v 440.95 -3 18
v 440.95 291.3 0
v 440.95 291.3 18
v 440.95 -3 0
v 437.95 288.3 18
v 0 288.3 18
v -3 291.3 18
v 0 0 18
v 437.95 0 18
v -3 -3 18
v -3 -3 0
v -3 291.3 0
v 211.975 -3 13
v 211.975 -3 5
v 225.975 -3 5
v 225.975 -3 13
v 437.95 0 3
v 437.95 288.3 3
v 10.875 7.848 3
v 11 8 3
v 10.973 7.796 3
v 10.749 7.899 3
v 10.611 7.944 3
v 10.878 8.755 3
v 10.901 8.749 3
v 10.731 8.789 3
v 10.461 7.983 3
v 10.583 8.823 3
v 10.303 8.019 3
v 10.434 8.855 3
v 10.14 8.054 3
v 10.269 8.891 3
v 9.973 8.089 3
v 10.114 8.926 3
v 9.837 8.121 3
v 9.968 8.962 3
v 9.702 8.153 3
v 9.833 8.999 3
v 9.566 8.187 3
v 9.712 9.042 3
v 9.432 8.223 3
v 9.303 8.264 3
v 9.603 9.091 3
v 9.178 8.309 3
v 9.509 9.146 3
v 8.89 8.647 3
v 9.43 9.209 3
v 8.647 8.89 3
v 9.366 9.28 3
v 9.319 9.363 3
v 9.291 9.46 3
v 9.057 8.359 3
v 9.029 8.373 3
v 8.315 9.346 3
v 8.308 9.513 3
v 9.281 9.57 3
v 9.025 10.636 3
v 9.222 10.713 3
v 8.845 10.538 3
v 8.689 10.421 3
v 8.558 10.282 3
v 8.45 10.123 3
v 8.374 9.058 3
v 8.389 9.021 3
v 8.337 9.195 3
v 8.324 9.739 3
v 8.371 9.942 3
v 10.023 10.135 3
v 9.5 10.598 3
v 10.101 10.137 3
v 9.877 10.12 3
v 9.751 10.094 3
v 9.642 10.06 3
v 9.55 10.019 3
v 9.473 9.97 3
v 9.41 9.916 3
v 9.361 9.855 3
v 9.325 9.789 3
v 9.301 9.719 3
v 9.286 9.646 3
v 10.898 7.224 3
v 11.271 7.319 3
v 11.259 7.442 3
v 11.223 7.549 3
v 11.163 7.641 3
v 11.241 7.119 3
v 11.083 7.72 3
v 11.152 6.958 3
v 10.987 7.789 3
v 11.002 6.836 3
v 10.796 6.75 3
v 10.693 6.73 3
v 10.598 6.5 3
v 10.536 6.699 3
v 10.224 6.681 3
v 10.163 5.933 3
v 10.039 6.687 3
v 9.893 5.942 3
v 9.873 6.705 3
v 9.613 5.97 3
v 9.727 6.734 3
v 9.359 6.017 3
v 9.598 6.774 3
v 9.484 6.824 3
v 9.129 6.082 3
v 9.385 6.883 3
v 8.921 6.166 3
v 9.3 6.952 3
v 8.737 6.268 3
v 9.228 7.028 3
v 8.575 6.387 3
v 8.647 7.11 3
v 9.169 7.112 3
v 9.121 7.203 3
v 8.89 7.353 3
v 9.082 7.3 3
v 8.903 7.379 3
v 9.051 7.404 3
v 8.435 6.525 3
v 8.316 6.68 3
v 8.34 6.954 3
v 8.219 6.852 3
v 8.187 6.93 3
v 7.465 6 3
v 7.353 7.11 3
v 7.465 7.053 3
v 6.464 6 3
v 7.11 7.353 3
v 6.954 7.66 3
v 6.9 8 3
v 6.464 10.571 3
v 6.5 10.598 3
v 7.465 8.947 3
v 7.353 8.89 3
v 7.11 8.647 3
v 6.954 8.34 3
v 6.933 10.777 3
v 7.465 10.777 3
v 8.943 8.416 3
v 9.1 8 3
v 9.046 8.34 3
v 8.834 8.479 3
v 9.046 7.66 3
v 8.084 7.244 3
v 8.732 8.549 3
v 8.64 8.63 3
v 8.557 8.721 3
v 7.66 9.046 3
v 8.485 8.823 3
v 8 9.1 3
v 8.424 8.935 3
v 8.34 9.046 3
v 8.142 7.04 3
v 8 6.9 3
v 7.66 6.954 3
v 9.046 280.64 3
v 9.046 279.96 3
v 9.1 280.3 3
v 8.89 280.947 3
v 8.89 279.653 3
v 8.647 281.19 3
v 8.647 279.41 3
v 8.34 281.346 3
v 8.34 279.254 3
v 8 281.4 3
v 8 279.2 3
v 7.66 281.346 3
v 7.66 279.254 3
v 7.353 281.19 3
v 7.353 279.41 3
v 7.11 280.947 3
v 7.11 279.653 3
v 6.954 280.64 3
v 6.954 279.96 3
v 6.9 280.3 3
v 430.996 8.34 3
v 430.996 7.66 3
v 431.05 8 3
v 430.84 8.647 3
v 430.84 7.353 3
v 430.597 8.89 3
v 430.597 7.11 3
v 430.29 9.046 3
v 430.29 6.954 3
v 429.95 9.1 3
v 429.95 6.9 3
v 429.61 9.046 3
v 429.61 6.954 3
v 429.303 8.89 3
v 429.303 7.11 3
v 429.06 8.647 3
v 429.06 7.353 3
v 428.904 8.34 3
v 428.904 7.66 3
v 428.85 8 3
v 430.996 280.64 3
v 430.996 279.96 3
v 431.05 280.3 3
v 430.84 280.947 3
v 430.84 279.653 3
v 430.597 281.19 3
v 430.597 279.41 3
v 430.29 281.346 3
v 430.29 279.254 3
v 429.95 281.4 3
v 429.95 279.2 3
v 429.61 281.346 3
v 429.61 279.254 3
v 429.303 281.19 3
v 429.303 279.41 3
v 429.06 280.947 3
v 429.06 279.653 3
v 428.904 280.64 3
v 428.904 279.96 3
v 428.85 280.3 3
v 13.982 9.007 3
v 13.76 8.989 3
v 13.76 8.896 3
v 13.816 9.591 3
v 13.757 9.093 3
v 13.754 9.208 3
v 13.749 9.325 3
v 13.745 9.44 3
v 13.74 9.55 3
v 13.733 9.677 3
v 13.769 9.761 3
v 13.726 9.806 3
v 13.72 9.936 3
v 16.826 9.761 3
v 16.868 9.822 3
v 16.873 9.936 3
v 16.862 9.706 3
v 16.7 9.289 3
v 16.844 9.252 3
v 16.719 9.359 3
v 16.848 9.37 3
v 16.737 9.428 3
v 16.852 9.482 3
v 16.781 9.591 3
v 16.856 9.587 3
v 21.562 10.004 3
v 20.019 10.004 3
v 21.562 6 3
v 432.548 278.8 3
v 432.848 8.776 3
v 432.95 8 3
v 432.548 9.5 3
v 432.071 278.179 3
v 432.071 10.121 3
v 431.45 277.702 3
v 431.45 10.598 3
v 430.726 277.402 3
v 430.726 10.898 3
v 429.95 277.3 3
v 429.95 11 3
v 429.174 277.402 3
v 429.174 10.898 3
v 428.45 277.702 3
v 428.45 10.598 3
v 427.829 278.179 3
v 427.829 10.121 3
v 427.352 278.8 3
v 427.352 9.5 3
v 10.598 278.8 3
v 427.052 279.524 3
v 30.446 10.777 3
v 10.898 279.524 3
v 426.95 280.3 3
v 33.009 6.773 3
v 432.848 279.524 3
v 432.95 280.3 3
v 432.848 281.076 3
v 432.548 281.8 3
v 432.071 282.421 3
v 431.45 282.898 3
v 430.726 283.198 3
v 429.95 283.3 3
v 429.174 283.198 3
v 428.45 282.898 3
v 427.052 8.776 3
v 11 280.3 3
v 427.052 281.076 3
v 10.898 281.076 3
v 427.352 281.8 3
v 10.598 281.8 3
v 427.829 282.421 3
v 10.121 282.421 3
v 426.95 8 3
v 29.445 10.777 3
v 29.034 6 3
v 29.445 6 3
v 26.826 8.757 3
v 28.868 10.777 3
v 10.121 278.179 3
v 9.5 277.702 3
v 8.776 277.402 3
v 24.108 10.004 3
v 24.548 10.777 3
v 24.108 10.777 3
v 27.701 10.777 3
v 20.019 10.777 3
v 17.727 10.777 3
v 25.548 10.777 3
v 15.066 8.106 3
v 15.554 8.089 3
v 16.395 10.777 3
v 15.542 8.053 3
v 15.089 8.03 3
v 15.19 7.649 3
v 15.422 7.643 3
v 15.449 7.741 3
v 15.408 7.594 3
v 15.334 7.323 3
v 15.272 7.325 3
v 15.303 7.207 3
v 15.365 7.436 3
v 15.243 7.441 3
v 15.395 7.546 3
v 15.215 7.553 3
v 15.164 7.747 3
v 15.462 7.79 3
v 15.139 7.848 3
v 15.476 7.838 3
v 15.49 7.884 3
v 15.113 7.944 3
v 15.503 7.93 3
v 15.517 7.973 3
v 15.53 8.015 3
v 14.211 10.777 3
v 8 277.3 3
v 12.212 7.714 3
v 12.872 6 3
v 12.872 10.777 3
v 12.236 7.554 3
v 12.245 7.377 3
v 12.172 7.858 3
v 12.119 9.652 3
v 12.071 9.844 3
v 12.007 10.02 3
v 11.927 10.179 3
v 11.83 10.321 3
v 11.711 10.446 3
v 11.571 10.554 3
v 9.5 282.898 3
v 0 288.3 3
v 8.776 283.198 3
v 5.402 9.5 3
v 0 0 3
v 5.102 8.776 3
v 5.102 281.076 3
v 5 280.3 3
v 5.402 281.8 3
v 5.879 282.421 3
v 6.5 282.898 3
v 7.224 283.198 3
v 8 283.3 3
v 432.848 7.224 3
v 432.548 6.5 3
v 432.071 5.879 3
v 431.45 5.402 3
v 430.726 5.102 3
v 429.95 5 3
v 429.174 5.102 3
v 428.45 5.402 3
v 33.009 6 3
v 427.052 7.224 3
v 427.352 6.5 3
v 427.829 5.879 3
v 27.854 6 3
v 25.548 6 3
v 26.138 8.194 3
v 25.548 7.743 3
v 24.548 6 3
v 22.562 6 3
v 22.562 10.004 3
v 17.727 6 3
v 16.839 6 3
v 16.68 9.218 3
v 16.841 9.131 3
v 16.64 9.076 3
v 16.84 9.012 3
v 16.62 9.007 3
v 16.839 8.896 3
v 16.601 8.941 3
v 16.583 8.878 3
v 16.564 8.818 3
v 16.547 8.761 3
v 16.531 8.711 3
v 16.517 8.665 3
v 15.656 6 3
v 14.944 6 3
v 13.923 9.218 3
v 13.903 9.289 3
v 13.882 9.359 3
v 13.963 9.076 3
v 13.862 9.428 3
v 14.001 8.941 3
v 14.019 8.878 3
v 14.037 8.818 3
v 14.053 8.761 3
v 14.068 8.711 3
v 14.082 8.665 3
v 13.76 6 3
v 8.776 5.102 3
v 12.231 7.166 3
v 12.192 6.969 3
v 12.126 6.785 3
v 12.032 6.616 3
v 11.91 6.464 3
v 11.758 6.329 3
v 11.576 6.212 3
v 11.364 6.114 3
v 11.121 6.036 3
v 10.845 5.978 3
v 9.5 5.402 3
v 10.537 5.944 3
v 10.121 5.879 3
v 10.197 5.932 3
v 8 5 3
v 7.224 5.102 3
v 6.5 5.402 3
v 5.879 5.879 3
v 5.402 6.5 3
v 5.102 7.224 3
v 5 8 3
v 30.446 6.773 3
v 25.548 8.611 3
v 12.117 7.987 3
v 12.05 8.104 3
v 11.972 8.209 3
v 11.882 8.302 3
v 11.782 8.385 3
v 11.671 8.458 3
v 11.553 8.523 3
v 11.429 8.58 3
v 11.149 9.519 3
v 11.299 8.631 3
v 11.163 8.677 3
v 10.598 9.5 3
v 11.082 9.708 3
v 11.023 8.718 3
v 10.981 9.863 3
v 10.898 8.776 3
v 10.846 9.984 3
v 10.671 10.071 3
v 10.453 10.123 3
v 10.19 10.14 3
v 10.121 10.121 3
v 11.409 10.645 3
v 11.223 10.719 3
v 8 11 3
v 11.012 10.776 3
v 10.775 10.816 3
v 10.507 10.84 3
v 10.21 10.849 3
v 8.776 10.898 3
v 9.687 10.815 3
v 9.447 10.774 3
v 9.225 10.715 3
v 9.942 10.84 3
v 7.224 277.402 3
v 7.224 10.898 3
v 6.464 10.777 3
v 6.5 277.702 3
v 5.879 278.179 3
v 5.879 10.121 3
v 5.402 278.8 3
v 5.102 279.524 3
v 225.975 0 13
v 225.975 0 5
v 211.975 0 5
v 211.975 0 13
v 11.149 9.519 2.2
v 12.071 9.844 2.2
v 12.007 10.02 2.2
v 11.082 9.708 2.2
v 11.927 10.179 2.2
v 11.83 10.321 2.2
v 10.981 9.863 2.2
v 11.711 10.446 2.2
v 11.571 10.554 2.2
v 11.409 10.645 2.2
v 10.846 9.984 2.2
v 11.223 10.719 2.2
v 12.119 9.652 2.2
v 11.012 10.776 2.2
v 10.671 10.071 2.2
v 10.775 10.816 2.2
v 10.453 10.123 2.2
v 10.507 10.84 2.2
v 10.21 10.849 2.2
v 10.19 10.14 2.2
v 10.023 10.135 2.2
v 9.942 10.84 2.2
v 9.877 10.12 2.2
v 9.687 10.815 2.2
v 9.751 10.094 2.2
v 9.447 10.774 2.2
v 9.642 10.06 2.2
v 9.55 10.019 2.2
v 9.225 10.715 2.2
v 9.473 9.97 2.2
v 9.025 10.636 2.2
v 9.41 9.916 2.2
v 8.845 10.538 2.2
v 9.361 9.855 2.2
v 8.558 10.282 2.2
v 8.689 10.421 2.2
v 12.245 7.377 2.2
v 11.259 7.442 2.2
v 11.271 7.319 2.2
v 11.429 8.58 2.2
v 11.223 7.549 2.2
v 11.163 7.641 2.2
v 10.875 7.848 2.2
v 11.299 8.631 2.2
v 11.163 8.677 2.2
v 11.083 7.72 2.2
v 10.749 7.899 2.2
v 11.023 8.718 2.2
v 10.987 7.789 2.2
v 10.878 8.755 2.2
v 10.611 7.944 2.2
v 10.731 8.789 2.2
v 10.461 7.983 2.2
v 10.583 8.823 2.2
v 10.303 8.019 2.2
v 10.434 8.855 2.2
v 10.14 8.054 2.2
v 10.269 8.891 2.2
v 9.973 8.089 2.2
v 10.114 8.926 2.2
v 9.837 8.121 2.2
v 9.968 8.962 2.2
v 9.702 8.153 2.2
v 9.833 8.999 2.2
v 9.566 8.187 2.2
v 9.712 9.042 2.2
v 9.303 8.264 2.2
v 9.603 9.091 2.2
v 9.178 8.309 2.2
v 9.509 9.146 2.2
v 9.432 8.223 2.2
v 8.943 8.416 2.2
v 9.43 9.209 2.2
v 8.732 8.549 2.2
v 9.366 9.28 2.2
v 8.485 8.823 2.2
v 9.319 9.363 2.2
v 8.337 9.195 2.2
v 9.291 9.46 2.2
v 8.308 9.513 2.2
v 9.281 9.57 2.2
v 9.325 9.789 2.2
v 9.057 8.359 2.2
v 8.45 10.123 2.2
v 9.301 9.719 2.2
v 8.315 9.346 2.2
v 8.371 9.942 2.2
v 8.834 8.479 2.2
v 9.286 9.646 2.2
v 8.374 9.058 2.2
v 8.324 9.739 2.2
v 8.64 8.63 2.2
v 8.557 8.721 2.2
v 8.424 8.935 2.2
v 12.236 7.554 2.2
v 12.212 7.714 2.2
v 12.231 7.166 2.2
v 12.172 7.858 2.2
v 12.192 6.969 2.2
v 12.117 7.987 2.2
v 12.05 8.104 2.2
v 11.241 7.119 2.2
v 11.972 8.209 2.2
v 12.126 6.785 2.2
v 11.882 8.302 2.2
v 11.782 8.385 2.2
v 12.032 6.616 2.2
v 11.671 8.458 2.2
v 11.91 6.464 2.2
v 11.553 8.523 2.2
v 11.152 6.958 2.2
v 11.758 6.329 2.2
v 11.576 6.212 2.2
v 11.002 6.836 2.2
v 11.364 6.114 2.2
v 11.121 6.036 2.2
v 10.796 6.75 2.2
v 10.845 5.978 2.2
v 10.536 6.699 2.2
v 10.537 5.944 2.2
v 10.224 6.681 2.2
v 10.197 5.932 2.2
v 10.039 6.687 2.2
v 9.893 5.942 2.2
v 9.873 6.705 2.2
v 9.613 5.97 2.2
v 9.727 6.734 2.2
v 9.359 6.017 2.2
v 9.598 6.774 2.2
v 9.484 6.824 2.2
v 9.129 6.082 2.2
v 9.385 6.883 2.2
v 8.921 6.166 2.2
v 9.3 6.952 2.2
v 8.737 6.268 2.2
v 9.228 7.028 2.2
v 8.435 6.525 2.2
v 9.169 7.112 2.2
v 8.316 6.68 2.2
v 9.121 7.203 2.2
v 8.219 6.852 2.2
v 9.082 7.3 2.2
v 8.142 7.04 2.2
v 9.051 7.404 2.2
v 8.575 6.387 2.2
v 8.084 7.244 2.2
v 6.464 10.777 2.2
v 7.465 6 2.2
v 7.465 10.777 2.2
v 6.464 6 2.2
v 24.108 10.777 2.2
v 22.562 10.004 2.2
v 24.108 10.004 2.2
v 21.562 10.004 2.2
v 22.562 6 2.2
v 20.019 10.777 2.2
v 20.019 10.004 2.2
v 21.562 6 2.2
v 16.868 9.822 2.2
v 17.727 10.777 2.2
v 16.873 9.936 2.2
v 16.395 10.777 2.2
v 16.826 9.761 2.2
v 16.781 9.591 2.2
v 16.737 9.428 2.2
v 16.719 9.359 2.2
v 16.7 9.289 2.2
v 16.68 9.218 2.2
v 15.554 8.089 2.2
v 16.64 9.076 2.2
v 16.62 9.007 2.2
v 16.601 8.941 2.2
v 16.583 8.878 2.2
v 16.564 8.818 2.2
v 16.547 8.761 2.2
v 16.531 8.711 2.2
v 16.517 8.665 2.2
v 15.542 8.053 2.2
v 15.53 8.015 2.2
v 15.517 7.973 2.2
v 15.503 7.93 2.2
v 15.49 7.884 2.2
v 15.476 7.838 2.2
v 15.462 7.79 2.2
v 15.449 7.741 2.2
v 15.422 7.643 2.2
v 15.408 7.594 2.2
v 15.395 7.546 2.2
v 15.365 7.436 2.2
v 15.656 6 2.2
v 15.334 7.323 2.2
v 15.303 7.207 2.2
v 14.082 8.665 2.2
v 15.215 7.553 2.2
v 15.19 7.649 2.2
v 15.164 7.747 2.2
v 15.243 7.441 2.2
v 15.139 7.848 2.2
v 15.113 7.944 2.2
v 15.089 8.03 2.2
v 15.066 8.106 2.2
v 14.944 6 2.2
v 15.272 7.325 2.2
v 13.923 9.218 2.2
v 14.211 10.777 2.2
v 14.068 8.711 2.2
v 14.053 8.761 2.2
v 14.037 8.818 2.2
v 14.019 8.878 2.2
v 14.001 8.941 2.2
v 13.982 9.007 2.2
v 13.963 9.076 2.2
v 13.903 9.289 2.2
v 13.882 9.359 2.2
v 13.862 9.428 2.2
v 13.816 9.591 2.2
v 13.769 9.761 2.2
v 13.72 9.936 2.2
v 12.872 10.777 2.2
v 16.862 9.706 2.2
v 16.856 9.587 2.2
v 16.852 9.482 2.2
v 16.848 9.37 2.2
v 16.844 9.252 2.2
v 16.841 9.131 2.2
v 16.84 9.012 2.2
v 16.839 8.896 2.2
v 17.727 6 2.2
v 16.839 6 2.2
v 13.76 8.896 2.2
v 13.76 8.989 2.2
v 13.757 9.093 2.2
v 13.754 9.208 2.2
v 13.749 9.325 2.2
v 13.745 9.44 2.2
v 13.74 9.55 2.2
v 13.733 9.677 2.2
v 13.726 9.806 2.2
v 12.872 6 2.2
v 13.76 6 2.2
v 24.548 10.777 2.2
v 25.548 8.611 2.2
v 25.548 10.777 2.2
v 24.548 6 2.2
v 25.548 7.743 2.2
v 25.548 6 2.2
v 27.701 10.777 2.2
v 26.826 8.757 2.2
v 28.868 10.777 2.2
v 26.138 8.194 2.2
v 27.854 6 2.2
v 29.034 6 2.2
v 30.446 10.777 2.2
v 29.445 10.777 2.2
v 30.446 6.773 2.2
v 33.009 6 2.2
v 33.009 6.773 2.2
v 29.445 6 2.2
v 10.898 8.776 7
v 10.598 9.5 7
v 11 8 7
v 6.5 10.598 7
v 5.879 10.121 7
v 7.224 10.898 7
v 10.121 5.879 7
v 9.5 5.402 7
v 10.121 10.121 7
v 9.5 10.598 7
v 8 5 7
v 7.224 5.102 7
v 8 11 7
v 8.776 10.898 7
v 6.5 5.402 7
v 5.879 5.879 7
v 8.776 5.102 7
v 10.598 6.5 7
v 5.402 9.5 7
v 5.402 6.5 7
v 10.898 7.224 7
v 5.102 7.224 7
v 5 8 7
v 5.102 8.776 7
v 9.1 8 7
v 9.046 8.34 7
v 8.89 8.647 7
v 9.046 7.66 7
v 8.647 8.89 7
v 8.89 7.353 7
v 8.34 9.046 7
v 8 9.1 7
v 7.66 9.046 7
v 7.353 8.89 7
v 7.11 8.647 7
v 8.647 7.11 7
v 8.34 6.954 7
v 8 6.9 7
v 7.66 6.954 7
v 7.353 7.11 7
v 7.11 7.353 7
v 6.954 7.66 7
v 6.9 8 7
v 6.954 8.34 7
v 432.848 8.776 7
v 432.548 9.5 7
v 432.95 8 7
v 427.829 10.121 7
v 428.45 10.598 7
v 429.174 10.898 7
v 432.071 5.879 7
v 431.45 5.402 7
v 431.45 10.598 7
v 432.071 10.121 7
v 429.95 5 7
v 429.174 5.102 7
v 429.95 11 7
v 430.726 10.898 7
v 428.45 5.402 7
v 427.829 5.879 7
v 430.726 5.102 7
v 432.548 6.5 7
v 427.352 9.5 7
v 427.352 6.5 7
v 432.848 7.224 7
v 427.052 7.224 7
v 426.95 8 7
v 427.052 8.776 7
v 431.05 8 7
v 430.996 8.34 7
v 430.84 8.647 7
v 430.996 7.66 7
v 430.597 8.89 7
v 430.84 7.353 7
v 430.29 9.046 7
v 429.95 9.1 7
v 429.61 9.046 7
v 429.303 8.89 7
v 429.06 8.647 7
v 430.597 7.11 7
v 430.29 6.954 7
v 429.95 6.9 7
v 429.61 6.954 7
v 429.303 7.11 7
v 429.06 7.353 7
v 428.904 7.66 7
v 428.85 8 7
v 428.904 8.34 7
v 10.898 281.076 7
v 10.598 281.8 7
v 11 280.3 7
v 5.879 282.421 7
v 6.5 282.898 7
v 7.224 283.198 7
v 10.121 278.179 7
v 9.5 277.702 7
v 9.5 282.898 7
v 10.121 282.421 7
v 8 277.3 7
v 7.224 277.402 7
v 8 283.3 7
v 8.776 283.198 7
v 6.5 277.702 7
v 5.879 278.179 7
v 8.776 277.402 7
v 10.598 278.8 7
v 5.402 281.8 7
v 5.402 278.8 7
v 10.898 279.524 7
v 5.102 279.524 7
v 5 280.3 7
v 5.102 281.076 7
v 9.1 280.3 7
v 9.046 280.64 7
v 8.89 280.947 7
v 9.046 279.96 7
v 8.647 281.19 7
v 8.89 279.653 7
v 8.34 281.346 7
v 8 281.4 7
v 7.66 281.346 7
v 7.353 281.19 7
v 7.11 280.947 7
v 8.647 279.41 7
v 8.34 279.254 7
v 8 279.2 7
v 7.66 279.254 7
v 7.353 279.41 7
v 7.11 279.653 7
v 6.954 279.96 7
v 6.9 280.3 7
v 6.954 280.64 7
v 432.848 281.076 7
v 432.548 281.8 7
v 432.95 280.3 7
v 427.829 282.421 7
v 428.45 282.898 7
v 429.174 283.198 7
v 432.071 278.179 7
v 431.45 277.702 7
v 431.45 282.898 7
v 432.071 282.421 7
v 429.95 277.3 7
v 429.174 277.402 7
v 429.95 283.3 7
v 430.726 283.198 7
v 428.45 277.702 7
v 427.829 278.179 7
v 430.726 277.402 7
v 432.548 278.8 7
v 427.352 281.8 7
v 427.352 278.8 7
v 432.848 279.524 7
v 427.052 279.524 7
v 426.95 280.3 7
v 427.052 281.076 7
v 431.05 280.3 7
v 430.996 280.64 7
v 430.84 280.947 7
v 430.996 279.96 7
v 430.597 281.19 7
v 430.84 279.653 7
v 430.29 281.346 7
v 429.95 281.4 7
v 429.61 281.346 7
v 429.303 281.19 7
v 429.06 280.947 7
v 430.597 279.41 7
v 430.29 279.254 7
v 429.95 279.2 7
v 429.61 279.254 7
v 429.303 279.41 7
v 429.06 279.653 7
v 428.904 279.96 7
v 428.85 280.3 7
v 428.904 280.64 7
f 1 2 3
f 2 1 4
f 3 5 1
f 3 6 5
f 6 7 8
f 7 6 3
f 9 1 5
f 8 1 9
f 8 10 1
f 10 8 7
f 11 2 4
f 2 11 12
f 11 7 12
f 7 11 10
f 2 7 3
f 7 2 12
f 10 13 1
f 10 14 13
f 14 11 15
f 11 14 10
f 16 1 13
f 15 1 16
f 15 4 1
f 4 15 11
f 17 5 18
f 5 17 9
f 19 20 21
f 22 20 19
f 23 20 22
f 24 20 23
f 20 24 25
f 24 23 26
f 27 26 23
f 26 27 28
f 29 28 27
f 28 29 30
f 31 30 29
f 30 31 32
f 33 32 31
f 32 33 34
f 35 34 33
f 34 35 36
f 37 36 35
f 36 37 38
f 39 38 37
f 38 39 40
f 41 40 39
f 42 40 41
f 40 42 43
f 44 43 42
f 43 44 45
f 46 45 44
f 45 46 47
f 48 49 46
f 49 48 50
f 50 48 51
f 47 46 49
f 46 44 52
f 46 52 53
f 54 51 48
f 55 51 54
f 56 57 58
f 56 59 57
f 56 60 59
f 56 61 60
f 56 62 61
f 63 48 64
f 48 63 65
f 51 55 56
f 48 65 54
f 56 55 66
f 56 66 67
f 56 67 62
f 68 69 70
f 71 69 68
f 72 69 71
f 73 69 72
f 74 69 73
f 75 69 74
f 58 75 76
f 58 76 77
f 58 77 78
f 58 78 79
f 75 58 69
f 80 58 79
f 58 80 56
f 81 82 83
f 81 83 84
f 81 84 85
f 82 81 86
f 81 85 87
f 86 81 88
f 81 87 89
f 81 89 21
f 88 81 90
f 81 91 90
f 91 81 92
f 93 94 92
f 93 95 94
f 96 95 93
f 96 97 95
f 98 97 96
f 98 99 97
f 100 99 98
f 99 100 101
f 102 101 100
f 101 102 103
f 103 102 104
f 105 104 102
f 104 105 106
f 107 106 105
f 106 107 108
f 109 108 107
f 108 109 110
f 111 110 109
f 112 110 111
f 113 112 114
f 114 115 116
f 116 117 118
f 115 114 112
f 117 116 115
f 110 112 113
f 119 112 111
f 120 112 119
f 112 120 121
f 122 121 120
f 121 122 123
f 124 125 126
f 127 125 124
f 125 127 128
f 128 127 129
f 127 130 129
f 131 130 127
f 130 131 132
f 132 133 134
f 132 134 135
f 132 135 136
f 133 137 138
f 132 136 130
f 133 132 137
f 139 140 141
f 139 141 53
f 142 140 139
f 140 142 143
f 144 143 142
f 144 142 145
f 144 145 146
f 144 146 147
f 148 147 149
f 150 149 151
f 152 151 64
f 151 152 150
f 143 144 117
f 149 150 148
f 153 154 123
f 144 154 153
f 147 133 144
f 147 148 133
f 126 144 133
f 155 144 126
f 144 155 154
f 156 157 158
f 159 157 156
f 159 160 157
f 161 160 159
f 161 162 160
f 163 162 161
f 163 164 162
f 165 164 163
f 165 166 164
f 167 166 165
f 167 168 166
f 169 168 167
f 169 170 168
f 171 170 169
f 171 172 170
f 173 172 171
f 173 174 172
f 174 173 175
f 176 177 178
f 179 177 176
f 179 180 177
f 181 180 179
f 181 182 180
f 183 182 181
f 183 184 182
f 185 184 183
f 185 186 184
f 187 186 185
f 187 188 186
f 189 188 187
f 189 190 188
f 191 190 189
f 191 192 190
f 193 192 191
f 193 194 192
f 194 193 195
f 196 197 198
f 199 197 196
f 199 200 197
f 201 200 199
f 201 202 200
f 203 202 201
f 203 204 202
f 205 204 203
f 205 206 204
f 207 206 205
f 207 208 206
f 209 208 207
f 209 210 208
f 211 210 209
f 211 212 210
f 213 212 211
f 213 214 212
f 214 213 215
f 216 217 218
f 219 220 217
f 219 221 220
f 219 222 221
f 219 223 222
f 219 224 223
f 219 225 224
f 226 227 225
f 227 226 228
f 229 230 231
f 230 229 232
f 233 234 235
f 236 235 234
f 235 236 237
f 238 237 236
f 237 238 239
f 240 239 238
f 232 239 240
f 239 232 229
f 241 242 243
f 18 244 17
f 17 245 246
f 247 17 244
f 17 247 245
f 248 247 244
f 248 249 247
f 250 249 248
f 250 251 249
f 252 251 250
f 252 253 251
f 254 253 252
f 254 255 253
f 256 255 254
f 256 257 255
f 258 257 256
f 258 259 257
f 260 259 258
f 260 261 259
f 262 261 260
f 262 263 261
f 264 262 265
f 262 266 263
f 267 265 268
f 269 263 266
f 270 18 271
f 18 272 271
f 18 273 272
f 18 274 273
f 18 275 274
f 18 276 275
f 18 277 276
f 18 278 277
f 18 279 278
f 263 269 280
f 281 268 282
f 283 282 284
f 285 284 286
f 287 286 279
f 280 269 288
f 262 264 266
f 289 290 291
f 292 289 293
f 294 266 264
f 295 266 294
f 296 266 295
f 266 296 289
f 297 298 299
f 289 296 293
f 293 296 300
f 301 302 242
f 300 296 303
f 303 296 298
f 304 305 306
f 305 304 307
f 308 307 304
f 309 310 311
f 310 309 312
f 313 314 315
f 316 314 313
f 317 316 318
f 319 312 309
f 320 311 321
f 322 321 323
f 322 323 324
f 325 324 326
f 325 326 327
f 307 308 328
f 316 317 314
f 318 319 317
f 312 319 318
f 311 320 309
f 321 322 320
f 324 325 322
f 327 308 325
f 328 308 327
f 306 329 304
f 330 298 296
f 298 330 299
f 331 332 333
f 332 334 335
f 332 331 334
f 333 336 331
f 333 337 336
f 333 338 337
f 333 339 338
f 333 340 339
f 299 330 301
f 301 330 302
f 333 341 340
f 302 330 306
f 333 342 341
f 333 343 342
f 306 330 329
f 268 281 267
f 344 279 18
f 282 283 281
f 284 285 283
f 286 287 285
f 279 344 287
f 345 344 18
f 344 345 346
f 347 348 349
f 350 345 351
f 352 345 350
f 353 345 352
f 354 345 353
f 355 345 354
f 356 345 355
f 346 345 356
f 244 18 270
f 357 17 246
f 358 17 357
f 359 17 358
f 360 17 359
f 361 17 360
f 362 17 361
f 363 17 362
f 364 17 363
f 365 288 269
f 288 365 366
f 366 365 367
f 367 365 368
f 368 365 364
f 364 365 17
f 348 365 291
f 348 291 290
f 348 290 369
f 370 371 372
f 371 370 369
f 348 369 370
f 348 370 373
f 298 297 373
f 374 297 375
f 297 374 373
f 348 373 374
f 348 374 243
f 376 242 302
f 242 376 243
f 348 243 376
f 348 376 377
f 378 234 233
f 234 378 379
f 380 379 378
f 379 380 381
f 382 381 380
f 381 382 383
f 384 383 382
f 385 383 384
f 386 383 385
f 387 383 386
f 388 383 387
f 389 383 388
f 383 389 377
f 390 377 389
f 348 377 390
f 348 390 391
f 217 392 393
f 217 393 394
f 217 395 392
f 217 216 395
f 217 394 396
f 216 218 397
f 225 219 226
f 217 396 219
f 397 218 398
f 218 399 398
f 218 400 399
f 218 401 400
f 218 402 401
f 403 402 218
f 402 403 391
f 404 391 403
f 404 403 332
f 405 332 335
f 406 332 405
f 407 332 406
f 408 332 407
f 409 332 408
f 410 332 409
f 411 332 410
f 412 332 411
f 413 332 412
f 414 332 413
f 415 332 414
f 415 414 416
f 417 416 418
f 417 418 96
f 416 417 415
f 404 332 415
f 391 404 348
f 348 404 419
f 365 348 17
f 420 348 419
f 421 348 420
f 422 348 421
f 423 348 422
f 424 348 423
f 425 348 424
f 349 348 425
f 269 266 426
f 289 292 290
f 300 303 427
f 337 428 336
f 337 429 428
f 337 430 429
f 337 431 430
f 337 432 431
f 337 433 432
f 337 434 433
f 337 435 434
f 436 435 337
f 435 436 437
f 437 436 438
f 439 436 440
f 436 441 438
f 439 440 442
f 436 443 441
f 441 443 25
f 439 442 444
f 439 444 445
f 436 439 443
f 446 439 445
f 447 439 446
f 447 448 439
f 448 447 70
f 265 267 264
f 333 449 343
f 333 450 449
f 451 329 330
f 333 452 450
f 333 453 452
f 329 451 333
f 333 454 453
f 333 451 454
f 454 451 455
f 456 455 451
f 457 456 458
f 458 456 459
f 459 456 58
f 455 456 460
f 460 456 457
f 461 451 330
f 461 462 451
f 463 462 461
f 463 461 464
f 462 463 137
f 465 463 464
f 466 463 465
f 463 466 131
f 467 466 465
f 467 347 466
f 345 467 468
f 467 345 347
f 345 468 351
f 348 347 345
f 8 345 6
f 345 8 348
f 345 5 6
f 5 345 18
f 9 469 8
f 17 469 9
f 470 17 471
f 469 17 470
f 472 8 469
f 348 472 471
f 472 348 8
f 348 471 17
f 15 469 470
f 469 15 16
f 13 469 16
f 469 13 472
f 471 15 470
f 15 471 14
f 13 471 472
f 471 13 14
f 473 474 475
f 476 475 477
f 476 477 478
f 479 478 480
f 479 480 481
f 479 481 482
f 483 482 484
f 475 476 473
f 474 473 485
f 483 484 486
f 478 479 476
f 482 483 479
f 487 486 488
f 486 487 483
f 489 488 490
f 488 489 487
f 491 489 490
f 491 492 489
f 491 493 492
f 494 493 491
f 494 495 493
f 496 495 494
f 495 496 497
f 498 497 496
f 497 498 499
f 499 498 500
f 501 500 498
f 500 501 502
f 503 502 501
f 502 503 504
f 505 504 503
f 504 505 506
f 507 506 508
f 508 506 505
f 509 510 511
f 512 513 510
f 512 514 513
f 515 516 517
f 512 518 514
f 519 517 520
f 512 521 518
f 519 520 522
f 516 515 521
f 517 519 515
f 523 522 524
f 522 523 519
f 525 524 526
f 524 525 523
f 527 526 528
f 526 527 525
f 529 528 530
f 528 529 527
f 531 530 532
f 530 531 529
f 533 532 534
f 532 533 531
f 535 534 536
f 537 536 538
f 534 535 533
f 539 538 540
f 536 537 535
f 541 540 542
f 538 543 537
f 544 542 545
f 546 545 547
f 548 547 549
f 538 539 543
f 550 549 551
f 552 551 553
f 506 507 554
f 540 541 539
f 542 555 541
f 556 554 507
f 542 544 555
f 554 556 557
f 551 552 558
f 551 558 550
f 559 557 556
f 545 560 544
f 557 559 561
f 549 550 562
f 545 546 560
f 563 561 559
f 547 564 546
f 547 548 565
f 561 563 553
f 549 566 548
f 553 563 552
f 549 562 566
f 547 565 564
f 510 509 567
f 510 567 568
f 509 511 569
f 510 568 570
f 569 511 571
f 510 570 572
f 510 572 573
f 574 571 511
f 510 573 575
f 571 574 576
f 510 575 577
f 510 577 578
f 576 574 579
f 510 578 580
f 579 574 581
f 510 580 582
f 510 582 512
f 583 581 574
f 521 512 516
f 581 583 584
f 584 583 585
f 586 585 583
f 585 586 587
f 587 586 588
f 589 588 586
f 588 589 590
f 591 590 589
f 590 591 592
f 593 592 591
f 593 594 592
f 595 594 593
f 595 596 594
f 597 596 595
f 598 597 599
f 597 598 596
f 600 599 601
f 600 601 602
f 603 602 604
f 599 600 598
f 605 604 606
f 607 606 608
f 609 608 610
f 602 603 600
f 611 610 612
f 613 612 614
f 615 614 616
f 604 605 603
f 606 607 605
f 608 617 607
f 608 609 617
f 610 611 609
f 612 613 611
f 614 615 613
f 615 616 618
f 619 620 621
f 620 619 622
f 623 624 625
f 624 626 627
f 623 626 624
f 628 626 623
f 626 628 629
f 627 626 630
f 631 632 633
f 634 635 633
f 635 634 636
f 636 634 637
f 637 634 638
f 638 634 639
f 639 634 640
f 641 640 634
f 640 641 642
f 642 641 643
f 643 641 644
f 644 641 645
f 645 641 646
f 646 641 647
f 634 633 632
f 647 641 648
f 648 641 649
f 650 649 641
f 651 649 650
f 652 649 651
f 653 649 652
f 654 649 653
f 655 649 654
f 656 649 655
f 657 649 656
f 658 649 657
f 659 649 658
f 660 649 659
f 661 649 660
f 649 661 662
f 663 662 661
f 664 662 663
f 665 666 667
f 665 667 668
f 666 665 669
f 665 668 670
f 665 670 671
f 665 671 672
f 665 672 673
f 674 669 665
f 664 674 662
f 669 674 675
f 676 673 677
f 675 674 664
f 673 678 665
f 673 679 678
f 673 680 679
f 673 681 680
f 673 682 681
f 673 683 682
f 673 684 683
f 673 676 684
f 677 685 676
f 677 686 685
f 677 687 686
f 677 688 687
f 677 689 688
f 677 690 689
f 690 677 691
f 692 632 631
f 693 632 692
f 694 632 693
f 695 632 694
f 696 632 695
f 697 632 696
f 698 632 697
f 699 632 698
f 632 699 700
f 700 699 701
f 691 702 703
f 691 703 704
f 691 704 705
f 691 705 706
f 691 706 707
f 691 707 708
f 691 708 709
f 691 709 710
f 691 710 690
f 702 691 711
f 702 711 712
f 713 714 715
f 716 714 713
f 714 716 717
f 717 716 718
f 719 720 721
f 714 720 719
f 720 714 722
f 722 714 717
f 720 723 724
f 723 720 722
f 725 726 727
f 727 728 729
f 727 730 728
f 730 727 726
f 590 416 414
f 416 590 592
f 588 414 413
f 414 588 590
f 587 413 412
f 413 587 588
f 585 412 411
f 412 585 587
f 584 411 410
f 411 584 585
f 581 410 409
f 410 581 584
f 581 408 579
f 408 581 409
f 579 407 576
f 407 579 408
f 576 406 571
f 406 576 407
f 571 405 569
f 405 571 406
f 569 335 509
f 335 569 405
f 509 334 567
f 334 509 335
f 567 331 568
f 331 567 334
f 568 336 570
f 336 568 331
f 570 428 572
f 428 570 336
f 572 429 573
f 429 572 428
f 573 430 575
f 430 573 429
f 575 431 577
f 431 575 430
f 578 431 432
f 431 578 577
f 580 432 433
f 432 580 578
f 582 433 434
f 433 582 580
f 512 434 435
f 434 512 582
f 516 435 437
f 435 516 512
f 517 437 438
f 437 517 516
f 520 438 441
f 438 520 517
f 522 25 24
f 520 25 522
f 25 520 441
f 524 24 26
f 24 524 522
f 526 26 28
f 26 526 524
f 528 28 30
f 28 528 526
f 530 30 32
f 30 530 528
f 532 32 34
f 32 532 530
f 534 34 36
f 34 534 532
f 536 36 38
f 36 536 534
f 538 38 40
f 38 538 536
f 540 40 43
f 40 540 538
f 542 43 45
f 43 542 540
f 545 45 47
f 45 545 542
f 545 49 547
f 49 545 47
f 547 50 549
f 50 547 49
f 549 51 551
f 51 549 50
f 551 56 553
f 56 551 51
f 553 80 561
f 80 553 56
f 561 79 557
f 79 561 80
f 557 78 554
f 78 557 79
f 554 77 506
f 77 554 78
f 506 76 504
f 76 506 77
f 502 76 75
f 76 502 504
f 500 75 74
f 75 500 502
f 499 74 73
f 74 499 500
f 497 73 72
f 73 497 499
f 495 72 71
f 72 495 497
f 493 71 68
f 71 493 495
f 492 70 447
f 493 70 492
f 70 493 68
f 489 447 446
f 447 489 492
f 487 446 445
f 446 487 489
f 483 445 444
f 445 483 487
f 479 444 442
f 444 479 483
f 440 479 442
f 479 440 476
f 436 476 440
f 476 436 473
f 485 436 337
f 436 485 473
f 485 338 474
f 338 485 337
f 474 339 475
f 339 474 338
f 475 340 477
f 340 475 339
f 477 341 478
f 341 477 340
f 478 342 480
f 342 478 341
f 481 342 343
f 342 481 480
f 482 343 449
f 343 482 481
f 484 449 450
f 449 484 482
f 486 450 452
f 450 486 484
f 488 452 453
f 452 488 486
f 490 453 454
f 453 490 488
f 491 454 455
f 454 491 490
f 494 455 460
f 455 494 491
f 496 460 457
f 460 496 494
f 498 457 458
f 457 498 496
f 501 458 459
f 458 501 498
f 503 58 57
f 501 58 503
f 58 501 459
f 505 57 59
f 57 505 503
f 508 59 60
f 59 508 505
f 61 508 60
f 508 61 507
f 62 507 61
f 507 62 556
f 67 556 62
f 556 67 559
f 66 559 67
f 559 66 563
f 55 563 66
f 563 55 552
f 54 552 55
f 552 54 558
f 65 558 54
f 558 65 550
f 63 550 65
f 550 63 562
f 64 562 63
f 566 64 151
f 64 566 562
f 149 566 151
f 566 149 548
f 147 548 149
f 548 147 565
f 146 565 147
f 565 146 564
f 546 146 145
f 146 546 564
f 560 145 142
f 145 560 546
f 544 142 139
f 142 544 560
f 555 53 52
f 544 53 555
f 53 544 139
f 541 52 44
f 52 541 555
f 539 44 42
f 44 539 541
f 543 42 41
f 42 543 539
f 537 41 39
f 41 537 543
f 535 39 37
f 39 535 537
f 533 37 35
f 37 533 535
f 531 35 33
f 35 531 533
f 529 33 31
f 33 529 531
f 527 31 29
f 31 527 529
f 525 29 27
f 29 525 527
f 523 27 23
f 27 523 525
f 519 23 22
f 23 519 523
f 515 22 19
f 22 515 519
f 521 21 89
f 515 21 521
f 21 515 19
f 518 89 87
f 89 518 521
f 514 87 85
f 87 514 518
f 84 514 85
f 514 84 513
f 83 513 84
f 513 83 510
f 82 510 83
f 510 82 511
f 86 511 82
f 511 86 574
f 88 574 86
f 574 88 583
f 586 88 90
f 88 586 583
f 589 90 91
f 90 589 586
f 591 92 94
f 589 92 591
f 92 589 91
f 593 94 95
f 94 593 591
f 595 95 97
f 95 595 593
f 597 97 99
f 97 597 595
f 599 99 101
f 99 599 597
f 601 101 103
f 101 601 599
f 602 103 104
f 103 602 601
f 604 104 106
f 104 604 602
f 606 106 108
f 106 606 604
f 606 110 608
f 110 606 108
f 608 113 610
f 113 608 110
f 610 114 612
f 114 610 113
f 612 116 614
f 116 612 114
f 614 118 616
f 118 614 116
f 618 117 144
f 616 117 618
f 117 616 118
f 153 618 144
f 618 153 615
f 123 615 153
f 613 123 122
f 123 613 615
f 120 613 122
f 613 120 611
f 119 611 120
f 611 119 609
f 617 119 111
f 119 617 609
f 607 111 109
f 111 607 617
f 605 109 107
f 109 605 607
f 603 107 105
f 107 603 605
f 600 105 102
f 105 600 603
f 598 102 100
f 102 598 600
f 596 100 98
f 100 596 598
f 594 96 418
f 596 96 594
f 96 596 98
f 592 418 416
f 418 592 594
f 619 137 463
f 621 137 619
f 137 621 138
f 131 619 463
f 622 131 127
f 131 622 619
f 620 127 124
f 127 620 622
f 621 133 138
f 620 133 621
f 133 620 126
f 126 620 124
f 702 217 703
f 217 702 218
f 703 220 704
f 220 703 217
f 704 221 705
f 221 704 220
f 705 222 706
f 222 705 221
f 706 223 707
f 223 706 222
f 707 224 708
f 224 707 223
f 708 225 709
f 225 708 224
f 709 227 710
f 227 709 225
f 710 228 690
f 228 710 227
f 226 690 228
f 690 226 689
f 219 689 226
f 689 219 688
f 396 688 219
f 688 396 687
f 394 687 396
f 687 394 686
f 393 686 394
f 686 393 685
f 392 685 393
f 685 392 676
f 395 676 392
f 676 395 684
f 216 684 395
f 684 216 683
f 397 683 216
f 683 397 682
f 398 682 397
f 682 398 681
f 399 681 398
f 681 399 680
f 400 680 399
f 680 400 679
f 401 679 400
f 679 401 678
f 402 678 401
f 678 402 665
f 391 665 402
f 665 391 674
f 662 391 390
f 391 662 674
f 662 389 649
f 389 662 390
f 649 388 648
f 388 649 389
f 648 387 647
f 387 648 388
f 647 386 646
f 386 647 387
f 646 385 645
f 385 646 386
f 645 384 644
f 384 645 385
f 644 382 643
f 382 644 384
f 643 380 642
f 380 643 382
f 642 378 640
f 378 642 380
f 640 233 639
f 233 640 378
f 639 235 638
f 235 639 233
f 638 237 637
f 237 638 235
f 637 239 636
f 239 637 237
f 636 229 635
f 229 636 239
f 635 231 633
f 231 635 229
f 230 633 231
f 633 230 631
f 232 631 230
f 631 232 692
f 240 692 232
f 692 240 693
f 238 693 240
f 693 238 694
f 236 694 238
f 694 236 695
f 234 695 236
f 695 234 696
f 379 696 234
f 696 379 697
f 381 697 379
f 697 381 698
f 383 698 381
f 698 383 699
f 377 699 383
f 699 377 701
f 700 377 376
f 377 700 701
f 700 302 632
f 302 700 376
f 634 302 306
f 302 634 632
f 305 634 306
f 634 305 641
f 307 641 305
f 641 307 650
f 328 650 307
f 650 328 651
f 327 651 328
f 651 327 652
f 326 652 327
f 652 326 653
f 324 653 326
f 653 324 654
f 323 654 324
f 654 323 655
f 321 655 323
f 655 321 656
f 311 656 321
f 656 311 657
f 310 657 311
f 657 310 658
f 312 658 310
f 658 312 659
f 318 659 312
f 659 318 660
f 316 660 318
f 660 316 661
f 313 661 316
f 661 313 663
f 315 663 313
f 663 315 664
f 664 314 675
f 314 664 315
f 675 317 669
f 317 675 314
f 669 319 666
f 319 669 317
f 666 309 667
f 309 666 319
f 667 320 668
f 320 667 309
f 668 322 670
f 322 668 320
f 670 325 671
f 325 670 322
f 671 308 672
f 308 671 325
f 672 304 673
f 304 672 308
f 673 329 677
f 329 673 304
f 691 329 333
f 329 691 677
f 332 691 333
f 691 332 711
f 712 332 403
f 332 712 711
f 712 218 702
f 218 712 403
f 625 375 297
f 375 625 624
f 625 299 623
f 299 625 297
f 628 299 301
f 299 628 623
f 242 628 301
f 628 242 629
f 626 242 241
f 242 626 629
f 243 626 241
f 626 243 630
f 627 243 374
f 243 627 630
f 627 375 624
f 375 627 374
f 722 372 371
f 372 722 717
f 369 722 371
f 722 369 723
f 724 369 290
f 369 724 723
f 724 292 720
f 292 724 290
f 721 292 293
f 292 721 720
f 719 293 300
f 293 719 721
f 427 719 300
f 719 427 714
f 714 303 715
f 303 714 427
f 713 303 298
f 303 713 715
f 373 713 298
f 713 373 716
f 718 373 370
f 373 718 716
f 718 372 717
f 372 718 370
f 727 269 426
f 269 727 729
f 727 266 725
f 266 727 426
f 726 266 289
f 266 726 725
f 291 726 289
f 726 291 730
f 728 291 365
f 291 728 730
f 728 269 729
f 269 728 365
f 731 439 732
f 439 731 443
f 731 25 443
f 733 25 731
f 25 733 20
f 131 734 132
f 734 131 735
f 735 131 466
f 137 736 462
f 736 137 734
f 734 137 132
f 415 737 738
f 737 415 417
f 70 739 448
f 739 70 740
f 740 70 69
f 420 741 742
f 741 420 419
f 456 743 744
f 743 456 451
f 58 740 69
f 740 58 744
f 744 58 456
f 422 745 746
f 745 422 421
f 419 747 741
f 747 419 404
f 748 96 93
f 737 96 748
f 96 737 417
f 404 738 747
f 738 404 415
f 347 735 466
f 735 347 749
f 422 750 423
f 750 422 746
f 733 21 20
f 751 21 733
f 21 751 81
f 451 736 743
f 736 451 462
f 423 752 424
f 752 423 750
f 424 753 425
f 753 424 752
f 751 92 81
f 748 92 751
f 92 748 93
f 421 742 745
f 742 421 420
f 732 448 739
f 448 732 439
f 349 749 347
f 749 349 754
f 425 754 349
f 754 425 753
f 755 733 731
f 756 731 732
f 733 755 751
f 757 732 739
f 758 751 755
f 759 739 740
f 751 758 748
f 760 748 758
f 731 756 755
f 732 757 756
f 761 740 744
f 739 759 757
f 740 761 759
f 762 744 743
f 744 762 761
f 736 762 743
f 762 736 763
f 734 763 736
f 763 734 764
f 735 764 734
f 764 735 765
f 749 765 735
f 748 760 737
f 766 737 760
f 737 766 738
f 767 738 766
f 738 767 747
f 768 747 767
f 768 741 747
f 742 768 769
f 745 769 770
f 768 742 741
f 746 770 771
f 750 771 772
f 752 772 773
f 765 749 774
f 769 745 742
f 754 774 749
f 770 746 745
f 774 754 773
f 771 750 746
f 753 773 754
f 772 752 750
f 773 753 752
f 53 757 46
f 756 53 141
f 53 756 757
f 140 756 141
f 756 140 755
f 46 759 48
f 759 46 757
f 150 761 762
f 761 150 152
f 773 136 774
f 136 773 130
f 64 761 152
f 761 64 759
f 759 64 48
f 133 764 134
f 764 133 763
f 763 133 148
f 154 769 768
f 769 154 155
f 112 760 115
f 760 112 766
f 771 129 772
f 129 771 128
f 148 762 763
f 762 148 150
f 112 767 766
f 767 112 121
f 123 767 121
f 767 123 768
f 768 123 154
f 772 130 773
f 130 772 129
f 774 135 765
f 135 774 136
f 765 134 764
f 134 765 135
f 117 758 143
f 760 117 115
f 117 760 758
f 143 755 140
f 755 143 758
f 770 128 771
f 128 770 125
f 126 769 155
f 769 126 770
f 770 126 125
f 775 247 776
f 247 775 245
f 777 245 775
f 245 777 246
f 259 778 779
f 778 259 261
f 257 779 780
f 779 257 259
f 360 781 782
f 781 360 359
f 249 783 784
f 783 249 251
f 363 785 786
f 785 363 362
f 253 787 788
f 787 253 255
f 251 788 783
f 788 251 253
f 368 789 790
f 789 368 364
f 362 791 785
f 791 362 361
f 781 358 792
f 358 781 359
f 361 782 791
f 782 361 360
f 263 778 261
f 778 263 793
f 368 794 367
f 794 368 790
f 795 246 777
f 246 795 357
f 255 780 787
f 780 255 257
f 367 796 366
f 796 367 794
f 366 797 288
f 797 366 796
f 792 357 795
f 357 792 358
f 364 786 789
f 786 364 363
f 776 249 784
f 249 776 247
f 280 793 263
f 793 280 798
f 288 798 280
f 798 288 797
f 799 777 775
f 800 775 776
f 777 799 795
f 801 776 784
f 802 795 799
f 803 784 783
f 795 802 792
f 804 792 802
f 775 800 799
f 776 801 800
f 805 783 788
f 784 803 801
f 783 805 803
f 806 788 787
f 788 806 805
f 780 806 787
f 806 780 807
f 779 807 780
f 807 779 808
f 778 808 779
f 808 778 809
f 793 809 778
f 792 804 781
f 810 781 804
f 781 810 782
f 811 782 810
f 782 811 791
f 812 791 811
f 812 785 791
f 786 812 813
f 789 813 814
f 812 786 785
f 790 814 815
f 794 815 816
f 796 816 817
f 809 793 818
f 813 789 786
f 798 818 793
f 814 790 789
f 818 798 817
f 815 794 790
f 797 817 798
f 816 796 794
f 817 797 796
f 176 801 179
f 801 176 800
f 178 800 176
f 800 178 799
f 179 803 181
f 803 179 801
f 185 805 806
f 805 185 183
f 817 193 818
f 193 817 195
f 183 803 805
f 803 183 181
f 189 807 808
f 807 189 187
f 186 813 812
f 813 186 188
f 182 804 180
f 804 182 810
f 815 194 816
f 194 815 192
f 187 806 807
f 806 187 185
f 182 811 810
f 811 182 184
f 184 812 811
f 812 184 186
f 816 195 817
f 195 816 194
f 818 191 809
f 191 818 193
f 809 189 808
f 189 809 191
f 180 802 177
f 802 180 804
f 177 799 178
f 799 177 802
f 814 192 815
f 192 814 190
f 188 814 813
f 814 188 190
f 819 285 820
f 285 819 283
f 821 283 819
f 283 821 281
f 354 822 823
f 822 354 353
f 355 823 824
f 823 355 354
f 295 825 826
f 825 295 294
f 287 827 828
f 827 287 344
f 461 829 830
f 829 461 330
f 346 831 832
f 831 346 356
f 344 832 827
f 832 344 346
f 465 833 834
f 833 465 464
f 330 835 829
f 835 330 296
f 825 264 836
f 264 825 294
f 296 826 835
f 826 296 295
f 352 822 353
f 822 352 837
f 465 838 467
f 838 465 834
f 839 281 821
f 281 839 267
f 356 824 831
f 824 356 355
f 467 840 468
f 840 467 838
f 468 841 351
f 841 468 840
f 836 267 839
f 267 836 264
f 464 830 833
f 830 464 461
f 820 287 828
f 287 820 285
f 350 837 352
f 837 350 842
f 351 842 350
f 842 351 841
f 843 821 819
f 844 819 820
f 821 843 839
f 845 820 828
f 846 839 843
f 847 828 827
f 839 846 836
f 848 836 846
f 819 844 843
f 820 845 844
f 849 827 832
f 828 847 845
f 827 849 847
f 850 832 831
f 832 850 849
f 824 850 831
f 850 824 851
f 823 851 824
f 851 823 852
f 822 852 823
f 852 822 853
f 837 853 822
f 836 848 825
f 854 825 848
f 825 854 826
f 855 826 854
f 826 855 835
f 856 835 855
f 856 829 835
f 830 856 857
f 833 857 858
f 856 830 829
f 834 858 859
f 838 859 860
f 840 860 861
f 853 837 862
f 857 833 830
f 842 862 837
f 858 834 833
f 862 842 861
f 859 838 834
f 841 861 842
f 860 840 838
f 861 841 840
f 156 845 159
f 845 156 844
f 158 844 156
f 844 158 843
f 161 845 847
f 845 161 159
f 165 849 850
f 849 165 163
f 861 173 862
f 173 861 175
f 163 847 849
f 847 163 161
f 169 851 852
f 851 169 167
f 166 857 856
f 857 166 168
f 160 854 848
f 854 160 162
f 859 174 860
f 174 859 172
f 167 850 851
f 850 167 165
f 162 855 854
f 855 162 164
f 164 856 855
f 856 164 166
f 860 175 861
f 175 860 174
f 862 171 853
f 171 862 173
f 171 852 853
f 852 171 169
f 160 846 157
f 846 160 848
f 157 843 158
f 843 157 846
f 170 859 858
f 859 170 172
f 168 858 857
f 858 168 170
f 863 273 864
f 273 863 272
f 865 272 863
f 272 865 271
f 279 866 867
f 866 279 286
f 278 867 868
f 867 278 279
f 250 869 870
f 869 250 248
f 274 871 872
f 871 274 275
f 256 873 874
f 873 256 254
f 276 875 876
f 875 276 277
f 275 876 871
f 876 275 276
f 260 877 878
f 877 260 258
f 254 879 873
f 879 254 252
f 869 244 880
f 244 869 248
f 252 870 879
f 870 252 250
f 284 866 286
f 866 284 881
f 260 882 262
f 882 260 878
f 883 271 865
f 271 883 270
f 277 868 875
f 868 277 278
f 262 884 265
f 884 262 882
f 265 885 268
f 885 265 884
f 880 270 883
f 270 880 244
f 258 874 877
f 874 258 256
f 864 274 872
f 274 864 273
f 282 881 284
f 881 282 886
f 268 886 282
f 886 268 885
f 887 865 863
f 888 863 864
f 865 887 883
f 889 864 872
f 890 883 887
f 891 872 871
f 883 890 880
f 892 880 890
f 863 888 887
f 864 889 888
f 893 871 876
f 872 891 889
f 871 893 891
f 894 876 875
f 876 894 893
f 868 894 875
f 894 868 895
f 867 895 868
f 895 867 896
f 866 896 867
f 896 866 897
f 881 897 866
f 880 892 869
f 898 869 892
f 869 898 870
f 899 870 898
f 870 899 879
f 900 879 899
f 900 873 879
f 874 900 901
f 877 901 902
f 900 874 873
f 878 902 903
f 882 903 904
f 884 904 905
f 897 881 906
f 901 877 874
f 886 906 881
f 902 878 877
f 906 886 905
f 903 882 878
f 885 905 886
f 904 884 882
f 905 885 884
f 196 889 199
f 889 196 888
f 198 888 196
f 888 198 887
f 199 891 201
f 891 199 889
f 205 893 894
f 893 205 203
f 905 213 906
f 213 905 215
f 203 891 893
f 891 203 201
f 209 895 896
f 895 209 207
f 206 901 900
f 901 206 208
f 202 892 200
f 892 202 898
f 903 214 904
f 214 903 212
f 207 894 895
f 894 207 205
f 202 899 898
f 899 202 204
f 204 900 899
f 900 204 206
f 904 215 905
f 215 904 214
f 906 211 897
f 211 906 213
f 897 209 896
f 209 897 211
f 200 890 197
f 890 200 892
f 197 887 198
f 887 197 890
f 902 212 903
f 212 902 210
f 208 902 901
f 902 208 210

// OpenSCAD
// ISM TKL keyboard case — parametric OpenSCAD (original ISM design)
unit=19.05; rows=6; margin_x=18; margin_y=24; pcb_extra_x=40; pcb_units_x=19.0; pcb_extra_y=150;
wall=3; base_th=3; lip=1.2; usb_w=14; usb_h=8; mount_d=2.2; badge_depth=0.8;
pcb_w=margin_x*2+pcb_units_x*unit+pcb_extra_x; pcb_h=margin_y+rows*unit+pcb_extra_y;
case_w=pcb_w+2*wall; case_h=pcb_h+2*wall; case_z=18;
module switch_cutouts(){for(r=[0:rows-1],c=[0:18])translate([margin_x+(c+0.5)*unit,margin_y+(r+0.5)*unit,-1])cube([14,14,wall+4],center=true);}
module bottom_shell(){difference(){translate([-wall,-wall,0])cube([case_w,case_h,case_z]);translate([0,0,base_th])cube([pcb_w,pcb_h,case_z]);translate([pcb_w/2-usb_w/2,-wall-1,base_th+2])cube([usb_w,wall+4,usb_h]);translate([6,6,base_th-badge_depth])linear_extrude(height=badge_depth+0.1)text("ISM TKL",size=5,font="Liberation Sans:style=Bold");}for(p=[[8,8],[pcb_w-8,8],[8,pcb_h-8],[pcb_w-8,pcb_h-8]])translate([p[0],p[1],base_th])difference(){cylinder(h=4,d=6,$fn=24);translate([0,0,-0.1])cylinder(h=5,d=mount_d,$fn=20);}}
module top_plate(){difference(){translate([-lip,-lip,0])cube([pcb_w+2*lip,pcb_h+2*lip,wall]);switch_cutouts();translate([margin_x,margin_y+rows*unit+2,-1])cube([pcb_units_x*unit,pcb_extra_y-4,wall+2]);}}
module top_frame(){difference(){translate([-wall,-wall,0])cube([case_w,case_h,8]);translate([lip,lip,-1])cube([pcb_w-2*lip,pcb_h-2*lip,10]);translate([pcb_w/2-usb_w/2,-wall-1,2])cube([usb_w,wall+4,usb_h]);}}
bottom_shell();
